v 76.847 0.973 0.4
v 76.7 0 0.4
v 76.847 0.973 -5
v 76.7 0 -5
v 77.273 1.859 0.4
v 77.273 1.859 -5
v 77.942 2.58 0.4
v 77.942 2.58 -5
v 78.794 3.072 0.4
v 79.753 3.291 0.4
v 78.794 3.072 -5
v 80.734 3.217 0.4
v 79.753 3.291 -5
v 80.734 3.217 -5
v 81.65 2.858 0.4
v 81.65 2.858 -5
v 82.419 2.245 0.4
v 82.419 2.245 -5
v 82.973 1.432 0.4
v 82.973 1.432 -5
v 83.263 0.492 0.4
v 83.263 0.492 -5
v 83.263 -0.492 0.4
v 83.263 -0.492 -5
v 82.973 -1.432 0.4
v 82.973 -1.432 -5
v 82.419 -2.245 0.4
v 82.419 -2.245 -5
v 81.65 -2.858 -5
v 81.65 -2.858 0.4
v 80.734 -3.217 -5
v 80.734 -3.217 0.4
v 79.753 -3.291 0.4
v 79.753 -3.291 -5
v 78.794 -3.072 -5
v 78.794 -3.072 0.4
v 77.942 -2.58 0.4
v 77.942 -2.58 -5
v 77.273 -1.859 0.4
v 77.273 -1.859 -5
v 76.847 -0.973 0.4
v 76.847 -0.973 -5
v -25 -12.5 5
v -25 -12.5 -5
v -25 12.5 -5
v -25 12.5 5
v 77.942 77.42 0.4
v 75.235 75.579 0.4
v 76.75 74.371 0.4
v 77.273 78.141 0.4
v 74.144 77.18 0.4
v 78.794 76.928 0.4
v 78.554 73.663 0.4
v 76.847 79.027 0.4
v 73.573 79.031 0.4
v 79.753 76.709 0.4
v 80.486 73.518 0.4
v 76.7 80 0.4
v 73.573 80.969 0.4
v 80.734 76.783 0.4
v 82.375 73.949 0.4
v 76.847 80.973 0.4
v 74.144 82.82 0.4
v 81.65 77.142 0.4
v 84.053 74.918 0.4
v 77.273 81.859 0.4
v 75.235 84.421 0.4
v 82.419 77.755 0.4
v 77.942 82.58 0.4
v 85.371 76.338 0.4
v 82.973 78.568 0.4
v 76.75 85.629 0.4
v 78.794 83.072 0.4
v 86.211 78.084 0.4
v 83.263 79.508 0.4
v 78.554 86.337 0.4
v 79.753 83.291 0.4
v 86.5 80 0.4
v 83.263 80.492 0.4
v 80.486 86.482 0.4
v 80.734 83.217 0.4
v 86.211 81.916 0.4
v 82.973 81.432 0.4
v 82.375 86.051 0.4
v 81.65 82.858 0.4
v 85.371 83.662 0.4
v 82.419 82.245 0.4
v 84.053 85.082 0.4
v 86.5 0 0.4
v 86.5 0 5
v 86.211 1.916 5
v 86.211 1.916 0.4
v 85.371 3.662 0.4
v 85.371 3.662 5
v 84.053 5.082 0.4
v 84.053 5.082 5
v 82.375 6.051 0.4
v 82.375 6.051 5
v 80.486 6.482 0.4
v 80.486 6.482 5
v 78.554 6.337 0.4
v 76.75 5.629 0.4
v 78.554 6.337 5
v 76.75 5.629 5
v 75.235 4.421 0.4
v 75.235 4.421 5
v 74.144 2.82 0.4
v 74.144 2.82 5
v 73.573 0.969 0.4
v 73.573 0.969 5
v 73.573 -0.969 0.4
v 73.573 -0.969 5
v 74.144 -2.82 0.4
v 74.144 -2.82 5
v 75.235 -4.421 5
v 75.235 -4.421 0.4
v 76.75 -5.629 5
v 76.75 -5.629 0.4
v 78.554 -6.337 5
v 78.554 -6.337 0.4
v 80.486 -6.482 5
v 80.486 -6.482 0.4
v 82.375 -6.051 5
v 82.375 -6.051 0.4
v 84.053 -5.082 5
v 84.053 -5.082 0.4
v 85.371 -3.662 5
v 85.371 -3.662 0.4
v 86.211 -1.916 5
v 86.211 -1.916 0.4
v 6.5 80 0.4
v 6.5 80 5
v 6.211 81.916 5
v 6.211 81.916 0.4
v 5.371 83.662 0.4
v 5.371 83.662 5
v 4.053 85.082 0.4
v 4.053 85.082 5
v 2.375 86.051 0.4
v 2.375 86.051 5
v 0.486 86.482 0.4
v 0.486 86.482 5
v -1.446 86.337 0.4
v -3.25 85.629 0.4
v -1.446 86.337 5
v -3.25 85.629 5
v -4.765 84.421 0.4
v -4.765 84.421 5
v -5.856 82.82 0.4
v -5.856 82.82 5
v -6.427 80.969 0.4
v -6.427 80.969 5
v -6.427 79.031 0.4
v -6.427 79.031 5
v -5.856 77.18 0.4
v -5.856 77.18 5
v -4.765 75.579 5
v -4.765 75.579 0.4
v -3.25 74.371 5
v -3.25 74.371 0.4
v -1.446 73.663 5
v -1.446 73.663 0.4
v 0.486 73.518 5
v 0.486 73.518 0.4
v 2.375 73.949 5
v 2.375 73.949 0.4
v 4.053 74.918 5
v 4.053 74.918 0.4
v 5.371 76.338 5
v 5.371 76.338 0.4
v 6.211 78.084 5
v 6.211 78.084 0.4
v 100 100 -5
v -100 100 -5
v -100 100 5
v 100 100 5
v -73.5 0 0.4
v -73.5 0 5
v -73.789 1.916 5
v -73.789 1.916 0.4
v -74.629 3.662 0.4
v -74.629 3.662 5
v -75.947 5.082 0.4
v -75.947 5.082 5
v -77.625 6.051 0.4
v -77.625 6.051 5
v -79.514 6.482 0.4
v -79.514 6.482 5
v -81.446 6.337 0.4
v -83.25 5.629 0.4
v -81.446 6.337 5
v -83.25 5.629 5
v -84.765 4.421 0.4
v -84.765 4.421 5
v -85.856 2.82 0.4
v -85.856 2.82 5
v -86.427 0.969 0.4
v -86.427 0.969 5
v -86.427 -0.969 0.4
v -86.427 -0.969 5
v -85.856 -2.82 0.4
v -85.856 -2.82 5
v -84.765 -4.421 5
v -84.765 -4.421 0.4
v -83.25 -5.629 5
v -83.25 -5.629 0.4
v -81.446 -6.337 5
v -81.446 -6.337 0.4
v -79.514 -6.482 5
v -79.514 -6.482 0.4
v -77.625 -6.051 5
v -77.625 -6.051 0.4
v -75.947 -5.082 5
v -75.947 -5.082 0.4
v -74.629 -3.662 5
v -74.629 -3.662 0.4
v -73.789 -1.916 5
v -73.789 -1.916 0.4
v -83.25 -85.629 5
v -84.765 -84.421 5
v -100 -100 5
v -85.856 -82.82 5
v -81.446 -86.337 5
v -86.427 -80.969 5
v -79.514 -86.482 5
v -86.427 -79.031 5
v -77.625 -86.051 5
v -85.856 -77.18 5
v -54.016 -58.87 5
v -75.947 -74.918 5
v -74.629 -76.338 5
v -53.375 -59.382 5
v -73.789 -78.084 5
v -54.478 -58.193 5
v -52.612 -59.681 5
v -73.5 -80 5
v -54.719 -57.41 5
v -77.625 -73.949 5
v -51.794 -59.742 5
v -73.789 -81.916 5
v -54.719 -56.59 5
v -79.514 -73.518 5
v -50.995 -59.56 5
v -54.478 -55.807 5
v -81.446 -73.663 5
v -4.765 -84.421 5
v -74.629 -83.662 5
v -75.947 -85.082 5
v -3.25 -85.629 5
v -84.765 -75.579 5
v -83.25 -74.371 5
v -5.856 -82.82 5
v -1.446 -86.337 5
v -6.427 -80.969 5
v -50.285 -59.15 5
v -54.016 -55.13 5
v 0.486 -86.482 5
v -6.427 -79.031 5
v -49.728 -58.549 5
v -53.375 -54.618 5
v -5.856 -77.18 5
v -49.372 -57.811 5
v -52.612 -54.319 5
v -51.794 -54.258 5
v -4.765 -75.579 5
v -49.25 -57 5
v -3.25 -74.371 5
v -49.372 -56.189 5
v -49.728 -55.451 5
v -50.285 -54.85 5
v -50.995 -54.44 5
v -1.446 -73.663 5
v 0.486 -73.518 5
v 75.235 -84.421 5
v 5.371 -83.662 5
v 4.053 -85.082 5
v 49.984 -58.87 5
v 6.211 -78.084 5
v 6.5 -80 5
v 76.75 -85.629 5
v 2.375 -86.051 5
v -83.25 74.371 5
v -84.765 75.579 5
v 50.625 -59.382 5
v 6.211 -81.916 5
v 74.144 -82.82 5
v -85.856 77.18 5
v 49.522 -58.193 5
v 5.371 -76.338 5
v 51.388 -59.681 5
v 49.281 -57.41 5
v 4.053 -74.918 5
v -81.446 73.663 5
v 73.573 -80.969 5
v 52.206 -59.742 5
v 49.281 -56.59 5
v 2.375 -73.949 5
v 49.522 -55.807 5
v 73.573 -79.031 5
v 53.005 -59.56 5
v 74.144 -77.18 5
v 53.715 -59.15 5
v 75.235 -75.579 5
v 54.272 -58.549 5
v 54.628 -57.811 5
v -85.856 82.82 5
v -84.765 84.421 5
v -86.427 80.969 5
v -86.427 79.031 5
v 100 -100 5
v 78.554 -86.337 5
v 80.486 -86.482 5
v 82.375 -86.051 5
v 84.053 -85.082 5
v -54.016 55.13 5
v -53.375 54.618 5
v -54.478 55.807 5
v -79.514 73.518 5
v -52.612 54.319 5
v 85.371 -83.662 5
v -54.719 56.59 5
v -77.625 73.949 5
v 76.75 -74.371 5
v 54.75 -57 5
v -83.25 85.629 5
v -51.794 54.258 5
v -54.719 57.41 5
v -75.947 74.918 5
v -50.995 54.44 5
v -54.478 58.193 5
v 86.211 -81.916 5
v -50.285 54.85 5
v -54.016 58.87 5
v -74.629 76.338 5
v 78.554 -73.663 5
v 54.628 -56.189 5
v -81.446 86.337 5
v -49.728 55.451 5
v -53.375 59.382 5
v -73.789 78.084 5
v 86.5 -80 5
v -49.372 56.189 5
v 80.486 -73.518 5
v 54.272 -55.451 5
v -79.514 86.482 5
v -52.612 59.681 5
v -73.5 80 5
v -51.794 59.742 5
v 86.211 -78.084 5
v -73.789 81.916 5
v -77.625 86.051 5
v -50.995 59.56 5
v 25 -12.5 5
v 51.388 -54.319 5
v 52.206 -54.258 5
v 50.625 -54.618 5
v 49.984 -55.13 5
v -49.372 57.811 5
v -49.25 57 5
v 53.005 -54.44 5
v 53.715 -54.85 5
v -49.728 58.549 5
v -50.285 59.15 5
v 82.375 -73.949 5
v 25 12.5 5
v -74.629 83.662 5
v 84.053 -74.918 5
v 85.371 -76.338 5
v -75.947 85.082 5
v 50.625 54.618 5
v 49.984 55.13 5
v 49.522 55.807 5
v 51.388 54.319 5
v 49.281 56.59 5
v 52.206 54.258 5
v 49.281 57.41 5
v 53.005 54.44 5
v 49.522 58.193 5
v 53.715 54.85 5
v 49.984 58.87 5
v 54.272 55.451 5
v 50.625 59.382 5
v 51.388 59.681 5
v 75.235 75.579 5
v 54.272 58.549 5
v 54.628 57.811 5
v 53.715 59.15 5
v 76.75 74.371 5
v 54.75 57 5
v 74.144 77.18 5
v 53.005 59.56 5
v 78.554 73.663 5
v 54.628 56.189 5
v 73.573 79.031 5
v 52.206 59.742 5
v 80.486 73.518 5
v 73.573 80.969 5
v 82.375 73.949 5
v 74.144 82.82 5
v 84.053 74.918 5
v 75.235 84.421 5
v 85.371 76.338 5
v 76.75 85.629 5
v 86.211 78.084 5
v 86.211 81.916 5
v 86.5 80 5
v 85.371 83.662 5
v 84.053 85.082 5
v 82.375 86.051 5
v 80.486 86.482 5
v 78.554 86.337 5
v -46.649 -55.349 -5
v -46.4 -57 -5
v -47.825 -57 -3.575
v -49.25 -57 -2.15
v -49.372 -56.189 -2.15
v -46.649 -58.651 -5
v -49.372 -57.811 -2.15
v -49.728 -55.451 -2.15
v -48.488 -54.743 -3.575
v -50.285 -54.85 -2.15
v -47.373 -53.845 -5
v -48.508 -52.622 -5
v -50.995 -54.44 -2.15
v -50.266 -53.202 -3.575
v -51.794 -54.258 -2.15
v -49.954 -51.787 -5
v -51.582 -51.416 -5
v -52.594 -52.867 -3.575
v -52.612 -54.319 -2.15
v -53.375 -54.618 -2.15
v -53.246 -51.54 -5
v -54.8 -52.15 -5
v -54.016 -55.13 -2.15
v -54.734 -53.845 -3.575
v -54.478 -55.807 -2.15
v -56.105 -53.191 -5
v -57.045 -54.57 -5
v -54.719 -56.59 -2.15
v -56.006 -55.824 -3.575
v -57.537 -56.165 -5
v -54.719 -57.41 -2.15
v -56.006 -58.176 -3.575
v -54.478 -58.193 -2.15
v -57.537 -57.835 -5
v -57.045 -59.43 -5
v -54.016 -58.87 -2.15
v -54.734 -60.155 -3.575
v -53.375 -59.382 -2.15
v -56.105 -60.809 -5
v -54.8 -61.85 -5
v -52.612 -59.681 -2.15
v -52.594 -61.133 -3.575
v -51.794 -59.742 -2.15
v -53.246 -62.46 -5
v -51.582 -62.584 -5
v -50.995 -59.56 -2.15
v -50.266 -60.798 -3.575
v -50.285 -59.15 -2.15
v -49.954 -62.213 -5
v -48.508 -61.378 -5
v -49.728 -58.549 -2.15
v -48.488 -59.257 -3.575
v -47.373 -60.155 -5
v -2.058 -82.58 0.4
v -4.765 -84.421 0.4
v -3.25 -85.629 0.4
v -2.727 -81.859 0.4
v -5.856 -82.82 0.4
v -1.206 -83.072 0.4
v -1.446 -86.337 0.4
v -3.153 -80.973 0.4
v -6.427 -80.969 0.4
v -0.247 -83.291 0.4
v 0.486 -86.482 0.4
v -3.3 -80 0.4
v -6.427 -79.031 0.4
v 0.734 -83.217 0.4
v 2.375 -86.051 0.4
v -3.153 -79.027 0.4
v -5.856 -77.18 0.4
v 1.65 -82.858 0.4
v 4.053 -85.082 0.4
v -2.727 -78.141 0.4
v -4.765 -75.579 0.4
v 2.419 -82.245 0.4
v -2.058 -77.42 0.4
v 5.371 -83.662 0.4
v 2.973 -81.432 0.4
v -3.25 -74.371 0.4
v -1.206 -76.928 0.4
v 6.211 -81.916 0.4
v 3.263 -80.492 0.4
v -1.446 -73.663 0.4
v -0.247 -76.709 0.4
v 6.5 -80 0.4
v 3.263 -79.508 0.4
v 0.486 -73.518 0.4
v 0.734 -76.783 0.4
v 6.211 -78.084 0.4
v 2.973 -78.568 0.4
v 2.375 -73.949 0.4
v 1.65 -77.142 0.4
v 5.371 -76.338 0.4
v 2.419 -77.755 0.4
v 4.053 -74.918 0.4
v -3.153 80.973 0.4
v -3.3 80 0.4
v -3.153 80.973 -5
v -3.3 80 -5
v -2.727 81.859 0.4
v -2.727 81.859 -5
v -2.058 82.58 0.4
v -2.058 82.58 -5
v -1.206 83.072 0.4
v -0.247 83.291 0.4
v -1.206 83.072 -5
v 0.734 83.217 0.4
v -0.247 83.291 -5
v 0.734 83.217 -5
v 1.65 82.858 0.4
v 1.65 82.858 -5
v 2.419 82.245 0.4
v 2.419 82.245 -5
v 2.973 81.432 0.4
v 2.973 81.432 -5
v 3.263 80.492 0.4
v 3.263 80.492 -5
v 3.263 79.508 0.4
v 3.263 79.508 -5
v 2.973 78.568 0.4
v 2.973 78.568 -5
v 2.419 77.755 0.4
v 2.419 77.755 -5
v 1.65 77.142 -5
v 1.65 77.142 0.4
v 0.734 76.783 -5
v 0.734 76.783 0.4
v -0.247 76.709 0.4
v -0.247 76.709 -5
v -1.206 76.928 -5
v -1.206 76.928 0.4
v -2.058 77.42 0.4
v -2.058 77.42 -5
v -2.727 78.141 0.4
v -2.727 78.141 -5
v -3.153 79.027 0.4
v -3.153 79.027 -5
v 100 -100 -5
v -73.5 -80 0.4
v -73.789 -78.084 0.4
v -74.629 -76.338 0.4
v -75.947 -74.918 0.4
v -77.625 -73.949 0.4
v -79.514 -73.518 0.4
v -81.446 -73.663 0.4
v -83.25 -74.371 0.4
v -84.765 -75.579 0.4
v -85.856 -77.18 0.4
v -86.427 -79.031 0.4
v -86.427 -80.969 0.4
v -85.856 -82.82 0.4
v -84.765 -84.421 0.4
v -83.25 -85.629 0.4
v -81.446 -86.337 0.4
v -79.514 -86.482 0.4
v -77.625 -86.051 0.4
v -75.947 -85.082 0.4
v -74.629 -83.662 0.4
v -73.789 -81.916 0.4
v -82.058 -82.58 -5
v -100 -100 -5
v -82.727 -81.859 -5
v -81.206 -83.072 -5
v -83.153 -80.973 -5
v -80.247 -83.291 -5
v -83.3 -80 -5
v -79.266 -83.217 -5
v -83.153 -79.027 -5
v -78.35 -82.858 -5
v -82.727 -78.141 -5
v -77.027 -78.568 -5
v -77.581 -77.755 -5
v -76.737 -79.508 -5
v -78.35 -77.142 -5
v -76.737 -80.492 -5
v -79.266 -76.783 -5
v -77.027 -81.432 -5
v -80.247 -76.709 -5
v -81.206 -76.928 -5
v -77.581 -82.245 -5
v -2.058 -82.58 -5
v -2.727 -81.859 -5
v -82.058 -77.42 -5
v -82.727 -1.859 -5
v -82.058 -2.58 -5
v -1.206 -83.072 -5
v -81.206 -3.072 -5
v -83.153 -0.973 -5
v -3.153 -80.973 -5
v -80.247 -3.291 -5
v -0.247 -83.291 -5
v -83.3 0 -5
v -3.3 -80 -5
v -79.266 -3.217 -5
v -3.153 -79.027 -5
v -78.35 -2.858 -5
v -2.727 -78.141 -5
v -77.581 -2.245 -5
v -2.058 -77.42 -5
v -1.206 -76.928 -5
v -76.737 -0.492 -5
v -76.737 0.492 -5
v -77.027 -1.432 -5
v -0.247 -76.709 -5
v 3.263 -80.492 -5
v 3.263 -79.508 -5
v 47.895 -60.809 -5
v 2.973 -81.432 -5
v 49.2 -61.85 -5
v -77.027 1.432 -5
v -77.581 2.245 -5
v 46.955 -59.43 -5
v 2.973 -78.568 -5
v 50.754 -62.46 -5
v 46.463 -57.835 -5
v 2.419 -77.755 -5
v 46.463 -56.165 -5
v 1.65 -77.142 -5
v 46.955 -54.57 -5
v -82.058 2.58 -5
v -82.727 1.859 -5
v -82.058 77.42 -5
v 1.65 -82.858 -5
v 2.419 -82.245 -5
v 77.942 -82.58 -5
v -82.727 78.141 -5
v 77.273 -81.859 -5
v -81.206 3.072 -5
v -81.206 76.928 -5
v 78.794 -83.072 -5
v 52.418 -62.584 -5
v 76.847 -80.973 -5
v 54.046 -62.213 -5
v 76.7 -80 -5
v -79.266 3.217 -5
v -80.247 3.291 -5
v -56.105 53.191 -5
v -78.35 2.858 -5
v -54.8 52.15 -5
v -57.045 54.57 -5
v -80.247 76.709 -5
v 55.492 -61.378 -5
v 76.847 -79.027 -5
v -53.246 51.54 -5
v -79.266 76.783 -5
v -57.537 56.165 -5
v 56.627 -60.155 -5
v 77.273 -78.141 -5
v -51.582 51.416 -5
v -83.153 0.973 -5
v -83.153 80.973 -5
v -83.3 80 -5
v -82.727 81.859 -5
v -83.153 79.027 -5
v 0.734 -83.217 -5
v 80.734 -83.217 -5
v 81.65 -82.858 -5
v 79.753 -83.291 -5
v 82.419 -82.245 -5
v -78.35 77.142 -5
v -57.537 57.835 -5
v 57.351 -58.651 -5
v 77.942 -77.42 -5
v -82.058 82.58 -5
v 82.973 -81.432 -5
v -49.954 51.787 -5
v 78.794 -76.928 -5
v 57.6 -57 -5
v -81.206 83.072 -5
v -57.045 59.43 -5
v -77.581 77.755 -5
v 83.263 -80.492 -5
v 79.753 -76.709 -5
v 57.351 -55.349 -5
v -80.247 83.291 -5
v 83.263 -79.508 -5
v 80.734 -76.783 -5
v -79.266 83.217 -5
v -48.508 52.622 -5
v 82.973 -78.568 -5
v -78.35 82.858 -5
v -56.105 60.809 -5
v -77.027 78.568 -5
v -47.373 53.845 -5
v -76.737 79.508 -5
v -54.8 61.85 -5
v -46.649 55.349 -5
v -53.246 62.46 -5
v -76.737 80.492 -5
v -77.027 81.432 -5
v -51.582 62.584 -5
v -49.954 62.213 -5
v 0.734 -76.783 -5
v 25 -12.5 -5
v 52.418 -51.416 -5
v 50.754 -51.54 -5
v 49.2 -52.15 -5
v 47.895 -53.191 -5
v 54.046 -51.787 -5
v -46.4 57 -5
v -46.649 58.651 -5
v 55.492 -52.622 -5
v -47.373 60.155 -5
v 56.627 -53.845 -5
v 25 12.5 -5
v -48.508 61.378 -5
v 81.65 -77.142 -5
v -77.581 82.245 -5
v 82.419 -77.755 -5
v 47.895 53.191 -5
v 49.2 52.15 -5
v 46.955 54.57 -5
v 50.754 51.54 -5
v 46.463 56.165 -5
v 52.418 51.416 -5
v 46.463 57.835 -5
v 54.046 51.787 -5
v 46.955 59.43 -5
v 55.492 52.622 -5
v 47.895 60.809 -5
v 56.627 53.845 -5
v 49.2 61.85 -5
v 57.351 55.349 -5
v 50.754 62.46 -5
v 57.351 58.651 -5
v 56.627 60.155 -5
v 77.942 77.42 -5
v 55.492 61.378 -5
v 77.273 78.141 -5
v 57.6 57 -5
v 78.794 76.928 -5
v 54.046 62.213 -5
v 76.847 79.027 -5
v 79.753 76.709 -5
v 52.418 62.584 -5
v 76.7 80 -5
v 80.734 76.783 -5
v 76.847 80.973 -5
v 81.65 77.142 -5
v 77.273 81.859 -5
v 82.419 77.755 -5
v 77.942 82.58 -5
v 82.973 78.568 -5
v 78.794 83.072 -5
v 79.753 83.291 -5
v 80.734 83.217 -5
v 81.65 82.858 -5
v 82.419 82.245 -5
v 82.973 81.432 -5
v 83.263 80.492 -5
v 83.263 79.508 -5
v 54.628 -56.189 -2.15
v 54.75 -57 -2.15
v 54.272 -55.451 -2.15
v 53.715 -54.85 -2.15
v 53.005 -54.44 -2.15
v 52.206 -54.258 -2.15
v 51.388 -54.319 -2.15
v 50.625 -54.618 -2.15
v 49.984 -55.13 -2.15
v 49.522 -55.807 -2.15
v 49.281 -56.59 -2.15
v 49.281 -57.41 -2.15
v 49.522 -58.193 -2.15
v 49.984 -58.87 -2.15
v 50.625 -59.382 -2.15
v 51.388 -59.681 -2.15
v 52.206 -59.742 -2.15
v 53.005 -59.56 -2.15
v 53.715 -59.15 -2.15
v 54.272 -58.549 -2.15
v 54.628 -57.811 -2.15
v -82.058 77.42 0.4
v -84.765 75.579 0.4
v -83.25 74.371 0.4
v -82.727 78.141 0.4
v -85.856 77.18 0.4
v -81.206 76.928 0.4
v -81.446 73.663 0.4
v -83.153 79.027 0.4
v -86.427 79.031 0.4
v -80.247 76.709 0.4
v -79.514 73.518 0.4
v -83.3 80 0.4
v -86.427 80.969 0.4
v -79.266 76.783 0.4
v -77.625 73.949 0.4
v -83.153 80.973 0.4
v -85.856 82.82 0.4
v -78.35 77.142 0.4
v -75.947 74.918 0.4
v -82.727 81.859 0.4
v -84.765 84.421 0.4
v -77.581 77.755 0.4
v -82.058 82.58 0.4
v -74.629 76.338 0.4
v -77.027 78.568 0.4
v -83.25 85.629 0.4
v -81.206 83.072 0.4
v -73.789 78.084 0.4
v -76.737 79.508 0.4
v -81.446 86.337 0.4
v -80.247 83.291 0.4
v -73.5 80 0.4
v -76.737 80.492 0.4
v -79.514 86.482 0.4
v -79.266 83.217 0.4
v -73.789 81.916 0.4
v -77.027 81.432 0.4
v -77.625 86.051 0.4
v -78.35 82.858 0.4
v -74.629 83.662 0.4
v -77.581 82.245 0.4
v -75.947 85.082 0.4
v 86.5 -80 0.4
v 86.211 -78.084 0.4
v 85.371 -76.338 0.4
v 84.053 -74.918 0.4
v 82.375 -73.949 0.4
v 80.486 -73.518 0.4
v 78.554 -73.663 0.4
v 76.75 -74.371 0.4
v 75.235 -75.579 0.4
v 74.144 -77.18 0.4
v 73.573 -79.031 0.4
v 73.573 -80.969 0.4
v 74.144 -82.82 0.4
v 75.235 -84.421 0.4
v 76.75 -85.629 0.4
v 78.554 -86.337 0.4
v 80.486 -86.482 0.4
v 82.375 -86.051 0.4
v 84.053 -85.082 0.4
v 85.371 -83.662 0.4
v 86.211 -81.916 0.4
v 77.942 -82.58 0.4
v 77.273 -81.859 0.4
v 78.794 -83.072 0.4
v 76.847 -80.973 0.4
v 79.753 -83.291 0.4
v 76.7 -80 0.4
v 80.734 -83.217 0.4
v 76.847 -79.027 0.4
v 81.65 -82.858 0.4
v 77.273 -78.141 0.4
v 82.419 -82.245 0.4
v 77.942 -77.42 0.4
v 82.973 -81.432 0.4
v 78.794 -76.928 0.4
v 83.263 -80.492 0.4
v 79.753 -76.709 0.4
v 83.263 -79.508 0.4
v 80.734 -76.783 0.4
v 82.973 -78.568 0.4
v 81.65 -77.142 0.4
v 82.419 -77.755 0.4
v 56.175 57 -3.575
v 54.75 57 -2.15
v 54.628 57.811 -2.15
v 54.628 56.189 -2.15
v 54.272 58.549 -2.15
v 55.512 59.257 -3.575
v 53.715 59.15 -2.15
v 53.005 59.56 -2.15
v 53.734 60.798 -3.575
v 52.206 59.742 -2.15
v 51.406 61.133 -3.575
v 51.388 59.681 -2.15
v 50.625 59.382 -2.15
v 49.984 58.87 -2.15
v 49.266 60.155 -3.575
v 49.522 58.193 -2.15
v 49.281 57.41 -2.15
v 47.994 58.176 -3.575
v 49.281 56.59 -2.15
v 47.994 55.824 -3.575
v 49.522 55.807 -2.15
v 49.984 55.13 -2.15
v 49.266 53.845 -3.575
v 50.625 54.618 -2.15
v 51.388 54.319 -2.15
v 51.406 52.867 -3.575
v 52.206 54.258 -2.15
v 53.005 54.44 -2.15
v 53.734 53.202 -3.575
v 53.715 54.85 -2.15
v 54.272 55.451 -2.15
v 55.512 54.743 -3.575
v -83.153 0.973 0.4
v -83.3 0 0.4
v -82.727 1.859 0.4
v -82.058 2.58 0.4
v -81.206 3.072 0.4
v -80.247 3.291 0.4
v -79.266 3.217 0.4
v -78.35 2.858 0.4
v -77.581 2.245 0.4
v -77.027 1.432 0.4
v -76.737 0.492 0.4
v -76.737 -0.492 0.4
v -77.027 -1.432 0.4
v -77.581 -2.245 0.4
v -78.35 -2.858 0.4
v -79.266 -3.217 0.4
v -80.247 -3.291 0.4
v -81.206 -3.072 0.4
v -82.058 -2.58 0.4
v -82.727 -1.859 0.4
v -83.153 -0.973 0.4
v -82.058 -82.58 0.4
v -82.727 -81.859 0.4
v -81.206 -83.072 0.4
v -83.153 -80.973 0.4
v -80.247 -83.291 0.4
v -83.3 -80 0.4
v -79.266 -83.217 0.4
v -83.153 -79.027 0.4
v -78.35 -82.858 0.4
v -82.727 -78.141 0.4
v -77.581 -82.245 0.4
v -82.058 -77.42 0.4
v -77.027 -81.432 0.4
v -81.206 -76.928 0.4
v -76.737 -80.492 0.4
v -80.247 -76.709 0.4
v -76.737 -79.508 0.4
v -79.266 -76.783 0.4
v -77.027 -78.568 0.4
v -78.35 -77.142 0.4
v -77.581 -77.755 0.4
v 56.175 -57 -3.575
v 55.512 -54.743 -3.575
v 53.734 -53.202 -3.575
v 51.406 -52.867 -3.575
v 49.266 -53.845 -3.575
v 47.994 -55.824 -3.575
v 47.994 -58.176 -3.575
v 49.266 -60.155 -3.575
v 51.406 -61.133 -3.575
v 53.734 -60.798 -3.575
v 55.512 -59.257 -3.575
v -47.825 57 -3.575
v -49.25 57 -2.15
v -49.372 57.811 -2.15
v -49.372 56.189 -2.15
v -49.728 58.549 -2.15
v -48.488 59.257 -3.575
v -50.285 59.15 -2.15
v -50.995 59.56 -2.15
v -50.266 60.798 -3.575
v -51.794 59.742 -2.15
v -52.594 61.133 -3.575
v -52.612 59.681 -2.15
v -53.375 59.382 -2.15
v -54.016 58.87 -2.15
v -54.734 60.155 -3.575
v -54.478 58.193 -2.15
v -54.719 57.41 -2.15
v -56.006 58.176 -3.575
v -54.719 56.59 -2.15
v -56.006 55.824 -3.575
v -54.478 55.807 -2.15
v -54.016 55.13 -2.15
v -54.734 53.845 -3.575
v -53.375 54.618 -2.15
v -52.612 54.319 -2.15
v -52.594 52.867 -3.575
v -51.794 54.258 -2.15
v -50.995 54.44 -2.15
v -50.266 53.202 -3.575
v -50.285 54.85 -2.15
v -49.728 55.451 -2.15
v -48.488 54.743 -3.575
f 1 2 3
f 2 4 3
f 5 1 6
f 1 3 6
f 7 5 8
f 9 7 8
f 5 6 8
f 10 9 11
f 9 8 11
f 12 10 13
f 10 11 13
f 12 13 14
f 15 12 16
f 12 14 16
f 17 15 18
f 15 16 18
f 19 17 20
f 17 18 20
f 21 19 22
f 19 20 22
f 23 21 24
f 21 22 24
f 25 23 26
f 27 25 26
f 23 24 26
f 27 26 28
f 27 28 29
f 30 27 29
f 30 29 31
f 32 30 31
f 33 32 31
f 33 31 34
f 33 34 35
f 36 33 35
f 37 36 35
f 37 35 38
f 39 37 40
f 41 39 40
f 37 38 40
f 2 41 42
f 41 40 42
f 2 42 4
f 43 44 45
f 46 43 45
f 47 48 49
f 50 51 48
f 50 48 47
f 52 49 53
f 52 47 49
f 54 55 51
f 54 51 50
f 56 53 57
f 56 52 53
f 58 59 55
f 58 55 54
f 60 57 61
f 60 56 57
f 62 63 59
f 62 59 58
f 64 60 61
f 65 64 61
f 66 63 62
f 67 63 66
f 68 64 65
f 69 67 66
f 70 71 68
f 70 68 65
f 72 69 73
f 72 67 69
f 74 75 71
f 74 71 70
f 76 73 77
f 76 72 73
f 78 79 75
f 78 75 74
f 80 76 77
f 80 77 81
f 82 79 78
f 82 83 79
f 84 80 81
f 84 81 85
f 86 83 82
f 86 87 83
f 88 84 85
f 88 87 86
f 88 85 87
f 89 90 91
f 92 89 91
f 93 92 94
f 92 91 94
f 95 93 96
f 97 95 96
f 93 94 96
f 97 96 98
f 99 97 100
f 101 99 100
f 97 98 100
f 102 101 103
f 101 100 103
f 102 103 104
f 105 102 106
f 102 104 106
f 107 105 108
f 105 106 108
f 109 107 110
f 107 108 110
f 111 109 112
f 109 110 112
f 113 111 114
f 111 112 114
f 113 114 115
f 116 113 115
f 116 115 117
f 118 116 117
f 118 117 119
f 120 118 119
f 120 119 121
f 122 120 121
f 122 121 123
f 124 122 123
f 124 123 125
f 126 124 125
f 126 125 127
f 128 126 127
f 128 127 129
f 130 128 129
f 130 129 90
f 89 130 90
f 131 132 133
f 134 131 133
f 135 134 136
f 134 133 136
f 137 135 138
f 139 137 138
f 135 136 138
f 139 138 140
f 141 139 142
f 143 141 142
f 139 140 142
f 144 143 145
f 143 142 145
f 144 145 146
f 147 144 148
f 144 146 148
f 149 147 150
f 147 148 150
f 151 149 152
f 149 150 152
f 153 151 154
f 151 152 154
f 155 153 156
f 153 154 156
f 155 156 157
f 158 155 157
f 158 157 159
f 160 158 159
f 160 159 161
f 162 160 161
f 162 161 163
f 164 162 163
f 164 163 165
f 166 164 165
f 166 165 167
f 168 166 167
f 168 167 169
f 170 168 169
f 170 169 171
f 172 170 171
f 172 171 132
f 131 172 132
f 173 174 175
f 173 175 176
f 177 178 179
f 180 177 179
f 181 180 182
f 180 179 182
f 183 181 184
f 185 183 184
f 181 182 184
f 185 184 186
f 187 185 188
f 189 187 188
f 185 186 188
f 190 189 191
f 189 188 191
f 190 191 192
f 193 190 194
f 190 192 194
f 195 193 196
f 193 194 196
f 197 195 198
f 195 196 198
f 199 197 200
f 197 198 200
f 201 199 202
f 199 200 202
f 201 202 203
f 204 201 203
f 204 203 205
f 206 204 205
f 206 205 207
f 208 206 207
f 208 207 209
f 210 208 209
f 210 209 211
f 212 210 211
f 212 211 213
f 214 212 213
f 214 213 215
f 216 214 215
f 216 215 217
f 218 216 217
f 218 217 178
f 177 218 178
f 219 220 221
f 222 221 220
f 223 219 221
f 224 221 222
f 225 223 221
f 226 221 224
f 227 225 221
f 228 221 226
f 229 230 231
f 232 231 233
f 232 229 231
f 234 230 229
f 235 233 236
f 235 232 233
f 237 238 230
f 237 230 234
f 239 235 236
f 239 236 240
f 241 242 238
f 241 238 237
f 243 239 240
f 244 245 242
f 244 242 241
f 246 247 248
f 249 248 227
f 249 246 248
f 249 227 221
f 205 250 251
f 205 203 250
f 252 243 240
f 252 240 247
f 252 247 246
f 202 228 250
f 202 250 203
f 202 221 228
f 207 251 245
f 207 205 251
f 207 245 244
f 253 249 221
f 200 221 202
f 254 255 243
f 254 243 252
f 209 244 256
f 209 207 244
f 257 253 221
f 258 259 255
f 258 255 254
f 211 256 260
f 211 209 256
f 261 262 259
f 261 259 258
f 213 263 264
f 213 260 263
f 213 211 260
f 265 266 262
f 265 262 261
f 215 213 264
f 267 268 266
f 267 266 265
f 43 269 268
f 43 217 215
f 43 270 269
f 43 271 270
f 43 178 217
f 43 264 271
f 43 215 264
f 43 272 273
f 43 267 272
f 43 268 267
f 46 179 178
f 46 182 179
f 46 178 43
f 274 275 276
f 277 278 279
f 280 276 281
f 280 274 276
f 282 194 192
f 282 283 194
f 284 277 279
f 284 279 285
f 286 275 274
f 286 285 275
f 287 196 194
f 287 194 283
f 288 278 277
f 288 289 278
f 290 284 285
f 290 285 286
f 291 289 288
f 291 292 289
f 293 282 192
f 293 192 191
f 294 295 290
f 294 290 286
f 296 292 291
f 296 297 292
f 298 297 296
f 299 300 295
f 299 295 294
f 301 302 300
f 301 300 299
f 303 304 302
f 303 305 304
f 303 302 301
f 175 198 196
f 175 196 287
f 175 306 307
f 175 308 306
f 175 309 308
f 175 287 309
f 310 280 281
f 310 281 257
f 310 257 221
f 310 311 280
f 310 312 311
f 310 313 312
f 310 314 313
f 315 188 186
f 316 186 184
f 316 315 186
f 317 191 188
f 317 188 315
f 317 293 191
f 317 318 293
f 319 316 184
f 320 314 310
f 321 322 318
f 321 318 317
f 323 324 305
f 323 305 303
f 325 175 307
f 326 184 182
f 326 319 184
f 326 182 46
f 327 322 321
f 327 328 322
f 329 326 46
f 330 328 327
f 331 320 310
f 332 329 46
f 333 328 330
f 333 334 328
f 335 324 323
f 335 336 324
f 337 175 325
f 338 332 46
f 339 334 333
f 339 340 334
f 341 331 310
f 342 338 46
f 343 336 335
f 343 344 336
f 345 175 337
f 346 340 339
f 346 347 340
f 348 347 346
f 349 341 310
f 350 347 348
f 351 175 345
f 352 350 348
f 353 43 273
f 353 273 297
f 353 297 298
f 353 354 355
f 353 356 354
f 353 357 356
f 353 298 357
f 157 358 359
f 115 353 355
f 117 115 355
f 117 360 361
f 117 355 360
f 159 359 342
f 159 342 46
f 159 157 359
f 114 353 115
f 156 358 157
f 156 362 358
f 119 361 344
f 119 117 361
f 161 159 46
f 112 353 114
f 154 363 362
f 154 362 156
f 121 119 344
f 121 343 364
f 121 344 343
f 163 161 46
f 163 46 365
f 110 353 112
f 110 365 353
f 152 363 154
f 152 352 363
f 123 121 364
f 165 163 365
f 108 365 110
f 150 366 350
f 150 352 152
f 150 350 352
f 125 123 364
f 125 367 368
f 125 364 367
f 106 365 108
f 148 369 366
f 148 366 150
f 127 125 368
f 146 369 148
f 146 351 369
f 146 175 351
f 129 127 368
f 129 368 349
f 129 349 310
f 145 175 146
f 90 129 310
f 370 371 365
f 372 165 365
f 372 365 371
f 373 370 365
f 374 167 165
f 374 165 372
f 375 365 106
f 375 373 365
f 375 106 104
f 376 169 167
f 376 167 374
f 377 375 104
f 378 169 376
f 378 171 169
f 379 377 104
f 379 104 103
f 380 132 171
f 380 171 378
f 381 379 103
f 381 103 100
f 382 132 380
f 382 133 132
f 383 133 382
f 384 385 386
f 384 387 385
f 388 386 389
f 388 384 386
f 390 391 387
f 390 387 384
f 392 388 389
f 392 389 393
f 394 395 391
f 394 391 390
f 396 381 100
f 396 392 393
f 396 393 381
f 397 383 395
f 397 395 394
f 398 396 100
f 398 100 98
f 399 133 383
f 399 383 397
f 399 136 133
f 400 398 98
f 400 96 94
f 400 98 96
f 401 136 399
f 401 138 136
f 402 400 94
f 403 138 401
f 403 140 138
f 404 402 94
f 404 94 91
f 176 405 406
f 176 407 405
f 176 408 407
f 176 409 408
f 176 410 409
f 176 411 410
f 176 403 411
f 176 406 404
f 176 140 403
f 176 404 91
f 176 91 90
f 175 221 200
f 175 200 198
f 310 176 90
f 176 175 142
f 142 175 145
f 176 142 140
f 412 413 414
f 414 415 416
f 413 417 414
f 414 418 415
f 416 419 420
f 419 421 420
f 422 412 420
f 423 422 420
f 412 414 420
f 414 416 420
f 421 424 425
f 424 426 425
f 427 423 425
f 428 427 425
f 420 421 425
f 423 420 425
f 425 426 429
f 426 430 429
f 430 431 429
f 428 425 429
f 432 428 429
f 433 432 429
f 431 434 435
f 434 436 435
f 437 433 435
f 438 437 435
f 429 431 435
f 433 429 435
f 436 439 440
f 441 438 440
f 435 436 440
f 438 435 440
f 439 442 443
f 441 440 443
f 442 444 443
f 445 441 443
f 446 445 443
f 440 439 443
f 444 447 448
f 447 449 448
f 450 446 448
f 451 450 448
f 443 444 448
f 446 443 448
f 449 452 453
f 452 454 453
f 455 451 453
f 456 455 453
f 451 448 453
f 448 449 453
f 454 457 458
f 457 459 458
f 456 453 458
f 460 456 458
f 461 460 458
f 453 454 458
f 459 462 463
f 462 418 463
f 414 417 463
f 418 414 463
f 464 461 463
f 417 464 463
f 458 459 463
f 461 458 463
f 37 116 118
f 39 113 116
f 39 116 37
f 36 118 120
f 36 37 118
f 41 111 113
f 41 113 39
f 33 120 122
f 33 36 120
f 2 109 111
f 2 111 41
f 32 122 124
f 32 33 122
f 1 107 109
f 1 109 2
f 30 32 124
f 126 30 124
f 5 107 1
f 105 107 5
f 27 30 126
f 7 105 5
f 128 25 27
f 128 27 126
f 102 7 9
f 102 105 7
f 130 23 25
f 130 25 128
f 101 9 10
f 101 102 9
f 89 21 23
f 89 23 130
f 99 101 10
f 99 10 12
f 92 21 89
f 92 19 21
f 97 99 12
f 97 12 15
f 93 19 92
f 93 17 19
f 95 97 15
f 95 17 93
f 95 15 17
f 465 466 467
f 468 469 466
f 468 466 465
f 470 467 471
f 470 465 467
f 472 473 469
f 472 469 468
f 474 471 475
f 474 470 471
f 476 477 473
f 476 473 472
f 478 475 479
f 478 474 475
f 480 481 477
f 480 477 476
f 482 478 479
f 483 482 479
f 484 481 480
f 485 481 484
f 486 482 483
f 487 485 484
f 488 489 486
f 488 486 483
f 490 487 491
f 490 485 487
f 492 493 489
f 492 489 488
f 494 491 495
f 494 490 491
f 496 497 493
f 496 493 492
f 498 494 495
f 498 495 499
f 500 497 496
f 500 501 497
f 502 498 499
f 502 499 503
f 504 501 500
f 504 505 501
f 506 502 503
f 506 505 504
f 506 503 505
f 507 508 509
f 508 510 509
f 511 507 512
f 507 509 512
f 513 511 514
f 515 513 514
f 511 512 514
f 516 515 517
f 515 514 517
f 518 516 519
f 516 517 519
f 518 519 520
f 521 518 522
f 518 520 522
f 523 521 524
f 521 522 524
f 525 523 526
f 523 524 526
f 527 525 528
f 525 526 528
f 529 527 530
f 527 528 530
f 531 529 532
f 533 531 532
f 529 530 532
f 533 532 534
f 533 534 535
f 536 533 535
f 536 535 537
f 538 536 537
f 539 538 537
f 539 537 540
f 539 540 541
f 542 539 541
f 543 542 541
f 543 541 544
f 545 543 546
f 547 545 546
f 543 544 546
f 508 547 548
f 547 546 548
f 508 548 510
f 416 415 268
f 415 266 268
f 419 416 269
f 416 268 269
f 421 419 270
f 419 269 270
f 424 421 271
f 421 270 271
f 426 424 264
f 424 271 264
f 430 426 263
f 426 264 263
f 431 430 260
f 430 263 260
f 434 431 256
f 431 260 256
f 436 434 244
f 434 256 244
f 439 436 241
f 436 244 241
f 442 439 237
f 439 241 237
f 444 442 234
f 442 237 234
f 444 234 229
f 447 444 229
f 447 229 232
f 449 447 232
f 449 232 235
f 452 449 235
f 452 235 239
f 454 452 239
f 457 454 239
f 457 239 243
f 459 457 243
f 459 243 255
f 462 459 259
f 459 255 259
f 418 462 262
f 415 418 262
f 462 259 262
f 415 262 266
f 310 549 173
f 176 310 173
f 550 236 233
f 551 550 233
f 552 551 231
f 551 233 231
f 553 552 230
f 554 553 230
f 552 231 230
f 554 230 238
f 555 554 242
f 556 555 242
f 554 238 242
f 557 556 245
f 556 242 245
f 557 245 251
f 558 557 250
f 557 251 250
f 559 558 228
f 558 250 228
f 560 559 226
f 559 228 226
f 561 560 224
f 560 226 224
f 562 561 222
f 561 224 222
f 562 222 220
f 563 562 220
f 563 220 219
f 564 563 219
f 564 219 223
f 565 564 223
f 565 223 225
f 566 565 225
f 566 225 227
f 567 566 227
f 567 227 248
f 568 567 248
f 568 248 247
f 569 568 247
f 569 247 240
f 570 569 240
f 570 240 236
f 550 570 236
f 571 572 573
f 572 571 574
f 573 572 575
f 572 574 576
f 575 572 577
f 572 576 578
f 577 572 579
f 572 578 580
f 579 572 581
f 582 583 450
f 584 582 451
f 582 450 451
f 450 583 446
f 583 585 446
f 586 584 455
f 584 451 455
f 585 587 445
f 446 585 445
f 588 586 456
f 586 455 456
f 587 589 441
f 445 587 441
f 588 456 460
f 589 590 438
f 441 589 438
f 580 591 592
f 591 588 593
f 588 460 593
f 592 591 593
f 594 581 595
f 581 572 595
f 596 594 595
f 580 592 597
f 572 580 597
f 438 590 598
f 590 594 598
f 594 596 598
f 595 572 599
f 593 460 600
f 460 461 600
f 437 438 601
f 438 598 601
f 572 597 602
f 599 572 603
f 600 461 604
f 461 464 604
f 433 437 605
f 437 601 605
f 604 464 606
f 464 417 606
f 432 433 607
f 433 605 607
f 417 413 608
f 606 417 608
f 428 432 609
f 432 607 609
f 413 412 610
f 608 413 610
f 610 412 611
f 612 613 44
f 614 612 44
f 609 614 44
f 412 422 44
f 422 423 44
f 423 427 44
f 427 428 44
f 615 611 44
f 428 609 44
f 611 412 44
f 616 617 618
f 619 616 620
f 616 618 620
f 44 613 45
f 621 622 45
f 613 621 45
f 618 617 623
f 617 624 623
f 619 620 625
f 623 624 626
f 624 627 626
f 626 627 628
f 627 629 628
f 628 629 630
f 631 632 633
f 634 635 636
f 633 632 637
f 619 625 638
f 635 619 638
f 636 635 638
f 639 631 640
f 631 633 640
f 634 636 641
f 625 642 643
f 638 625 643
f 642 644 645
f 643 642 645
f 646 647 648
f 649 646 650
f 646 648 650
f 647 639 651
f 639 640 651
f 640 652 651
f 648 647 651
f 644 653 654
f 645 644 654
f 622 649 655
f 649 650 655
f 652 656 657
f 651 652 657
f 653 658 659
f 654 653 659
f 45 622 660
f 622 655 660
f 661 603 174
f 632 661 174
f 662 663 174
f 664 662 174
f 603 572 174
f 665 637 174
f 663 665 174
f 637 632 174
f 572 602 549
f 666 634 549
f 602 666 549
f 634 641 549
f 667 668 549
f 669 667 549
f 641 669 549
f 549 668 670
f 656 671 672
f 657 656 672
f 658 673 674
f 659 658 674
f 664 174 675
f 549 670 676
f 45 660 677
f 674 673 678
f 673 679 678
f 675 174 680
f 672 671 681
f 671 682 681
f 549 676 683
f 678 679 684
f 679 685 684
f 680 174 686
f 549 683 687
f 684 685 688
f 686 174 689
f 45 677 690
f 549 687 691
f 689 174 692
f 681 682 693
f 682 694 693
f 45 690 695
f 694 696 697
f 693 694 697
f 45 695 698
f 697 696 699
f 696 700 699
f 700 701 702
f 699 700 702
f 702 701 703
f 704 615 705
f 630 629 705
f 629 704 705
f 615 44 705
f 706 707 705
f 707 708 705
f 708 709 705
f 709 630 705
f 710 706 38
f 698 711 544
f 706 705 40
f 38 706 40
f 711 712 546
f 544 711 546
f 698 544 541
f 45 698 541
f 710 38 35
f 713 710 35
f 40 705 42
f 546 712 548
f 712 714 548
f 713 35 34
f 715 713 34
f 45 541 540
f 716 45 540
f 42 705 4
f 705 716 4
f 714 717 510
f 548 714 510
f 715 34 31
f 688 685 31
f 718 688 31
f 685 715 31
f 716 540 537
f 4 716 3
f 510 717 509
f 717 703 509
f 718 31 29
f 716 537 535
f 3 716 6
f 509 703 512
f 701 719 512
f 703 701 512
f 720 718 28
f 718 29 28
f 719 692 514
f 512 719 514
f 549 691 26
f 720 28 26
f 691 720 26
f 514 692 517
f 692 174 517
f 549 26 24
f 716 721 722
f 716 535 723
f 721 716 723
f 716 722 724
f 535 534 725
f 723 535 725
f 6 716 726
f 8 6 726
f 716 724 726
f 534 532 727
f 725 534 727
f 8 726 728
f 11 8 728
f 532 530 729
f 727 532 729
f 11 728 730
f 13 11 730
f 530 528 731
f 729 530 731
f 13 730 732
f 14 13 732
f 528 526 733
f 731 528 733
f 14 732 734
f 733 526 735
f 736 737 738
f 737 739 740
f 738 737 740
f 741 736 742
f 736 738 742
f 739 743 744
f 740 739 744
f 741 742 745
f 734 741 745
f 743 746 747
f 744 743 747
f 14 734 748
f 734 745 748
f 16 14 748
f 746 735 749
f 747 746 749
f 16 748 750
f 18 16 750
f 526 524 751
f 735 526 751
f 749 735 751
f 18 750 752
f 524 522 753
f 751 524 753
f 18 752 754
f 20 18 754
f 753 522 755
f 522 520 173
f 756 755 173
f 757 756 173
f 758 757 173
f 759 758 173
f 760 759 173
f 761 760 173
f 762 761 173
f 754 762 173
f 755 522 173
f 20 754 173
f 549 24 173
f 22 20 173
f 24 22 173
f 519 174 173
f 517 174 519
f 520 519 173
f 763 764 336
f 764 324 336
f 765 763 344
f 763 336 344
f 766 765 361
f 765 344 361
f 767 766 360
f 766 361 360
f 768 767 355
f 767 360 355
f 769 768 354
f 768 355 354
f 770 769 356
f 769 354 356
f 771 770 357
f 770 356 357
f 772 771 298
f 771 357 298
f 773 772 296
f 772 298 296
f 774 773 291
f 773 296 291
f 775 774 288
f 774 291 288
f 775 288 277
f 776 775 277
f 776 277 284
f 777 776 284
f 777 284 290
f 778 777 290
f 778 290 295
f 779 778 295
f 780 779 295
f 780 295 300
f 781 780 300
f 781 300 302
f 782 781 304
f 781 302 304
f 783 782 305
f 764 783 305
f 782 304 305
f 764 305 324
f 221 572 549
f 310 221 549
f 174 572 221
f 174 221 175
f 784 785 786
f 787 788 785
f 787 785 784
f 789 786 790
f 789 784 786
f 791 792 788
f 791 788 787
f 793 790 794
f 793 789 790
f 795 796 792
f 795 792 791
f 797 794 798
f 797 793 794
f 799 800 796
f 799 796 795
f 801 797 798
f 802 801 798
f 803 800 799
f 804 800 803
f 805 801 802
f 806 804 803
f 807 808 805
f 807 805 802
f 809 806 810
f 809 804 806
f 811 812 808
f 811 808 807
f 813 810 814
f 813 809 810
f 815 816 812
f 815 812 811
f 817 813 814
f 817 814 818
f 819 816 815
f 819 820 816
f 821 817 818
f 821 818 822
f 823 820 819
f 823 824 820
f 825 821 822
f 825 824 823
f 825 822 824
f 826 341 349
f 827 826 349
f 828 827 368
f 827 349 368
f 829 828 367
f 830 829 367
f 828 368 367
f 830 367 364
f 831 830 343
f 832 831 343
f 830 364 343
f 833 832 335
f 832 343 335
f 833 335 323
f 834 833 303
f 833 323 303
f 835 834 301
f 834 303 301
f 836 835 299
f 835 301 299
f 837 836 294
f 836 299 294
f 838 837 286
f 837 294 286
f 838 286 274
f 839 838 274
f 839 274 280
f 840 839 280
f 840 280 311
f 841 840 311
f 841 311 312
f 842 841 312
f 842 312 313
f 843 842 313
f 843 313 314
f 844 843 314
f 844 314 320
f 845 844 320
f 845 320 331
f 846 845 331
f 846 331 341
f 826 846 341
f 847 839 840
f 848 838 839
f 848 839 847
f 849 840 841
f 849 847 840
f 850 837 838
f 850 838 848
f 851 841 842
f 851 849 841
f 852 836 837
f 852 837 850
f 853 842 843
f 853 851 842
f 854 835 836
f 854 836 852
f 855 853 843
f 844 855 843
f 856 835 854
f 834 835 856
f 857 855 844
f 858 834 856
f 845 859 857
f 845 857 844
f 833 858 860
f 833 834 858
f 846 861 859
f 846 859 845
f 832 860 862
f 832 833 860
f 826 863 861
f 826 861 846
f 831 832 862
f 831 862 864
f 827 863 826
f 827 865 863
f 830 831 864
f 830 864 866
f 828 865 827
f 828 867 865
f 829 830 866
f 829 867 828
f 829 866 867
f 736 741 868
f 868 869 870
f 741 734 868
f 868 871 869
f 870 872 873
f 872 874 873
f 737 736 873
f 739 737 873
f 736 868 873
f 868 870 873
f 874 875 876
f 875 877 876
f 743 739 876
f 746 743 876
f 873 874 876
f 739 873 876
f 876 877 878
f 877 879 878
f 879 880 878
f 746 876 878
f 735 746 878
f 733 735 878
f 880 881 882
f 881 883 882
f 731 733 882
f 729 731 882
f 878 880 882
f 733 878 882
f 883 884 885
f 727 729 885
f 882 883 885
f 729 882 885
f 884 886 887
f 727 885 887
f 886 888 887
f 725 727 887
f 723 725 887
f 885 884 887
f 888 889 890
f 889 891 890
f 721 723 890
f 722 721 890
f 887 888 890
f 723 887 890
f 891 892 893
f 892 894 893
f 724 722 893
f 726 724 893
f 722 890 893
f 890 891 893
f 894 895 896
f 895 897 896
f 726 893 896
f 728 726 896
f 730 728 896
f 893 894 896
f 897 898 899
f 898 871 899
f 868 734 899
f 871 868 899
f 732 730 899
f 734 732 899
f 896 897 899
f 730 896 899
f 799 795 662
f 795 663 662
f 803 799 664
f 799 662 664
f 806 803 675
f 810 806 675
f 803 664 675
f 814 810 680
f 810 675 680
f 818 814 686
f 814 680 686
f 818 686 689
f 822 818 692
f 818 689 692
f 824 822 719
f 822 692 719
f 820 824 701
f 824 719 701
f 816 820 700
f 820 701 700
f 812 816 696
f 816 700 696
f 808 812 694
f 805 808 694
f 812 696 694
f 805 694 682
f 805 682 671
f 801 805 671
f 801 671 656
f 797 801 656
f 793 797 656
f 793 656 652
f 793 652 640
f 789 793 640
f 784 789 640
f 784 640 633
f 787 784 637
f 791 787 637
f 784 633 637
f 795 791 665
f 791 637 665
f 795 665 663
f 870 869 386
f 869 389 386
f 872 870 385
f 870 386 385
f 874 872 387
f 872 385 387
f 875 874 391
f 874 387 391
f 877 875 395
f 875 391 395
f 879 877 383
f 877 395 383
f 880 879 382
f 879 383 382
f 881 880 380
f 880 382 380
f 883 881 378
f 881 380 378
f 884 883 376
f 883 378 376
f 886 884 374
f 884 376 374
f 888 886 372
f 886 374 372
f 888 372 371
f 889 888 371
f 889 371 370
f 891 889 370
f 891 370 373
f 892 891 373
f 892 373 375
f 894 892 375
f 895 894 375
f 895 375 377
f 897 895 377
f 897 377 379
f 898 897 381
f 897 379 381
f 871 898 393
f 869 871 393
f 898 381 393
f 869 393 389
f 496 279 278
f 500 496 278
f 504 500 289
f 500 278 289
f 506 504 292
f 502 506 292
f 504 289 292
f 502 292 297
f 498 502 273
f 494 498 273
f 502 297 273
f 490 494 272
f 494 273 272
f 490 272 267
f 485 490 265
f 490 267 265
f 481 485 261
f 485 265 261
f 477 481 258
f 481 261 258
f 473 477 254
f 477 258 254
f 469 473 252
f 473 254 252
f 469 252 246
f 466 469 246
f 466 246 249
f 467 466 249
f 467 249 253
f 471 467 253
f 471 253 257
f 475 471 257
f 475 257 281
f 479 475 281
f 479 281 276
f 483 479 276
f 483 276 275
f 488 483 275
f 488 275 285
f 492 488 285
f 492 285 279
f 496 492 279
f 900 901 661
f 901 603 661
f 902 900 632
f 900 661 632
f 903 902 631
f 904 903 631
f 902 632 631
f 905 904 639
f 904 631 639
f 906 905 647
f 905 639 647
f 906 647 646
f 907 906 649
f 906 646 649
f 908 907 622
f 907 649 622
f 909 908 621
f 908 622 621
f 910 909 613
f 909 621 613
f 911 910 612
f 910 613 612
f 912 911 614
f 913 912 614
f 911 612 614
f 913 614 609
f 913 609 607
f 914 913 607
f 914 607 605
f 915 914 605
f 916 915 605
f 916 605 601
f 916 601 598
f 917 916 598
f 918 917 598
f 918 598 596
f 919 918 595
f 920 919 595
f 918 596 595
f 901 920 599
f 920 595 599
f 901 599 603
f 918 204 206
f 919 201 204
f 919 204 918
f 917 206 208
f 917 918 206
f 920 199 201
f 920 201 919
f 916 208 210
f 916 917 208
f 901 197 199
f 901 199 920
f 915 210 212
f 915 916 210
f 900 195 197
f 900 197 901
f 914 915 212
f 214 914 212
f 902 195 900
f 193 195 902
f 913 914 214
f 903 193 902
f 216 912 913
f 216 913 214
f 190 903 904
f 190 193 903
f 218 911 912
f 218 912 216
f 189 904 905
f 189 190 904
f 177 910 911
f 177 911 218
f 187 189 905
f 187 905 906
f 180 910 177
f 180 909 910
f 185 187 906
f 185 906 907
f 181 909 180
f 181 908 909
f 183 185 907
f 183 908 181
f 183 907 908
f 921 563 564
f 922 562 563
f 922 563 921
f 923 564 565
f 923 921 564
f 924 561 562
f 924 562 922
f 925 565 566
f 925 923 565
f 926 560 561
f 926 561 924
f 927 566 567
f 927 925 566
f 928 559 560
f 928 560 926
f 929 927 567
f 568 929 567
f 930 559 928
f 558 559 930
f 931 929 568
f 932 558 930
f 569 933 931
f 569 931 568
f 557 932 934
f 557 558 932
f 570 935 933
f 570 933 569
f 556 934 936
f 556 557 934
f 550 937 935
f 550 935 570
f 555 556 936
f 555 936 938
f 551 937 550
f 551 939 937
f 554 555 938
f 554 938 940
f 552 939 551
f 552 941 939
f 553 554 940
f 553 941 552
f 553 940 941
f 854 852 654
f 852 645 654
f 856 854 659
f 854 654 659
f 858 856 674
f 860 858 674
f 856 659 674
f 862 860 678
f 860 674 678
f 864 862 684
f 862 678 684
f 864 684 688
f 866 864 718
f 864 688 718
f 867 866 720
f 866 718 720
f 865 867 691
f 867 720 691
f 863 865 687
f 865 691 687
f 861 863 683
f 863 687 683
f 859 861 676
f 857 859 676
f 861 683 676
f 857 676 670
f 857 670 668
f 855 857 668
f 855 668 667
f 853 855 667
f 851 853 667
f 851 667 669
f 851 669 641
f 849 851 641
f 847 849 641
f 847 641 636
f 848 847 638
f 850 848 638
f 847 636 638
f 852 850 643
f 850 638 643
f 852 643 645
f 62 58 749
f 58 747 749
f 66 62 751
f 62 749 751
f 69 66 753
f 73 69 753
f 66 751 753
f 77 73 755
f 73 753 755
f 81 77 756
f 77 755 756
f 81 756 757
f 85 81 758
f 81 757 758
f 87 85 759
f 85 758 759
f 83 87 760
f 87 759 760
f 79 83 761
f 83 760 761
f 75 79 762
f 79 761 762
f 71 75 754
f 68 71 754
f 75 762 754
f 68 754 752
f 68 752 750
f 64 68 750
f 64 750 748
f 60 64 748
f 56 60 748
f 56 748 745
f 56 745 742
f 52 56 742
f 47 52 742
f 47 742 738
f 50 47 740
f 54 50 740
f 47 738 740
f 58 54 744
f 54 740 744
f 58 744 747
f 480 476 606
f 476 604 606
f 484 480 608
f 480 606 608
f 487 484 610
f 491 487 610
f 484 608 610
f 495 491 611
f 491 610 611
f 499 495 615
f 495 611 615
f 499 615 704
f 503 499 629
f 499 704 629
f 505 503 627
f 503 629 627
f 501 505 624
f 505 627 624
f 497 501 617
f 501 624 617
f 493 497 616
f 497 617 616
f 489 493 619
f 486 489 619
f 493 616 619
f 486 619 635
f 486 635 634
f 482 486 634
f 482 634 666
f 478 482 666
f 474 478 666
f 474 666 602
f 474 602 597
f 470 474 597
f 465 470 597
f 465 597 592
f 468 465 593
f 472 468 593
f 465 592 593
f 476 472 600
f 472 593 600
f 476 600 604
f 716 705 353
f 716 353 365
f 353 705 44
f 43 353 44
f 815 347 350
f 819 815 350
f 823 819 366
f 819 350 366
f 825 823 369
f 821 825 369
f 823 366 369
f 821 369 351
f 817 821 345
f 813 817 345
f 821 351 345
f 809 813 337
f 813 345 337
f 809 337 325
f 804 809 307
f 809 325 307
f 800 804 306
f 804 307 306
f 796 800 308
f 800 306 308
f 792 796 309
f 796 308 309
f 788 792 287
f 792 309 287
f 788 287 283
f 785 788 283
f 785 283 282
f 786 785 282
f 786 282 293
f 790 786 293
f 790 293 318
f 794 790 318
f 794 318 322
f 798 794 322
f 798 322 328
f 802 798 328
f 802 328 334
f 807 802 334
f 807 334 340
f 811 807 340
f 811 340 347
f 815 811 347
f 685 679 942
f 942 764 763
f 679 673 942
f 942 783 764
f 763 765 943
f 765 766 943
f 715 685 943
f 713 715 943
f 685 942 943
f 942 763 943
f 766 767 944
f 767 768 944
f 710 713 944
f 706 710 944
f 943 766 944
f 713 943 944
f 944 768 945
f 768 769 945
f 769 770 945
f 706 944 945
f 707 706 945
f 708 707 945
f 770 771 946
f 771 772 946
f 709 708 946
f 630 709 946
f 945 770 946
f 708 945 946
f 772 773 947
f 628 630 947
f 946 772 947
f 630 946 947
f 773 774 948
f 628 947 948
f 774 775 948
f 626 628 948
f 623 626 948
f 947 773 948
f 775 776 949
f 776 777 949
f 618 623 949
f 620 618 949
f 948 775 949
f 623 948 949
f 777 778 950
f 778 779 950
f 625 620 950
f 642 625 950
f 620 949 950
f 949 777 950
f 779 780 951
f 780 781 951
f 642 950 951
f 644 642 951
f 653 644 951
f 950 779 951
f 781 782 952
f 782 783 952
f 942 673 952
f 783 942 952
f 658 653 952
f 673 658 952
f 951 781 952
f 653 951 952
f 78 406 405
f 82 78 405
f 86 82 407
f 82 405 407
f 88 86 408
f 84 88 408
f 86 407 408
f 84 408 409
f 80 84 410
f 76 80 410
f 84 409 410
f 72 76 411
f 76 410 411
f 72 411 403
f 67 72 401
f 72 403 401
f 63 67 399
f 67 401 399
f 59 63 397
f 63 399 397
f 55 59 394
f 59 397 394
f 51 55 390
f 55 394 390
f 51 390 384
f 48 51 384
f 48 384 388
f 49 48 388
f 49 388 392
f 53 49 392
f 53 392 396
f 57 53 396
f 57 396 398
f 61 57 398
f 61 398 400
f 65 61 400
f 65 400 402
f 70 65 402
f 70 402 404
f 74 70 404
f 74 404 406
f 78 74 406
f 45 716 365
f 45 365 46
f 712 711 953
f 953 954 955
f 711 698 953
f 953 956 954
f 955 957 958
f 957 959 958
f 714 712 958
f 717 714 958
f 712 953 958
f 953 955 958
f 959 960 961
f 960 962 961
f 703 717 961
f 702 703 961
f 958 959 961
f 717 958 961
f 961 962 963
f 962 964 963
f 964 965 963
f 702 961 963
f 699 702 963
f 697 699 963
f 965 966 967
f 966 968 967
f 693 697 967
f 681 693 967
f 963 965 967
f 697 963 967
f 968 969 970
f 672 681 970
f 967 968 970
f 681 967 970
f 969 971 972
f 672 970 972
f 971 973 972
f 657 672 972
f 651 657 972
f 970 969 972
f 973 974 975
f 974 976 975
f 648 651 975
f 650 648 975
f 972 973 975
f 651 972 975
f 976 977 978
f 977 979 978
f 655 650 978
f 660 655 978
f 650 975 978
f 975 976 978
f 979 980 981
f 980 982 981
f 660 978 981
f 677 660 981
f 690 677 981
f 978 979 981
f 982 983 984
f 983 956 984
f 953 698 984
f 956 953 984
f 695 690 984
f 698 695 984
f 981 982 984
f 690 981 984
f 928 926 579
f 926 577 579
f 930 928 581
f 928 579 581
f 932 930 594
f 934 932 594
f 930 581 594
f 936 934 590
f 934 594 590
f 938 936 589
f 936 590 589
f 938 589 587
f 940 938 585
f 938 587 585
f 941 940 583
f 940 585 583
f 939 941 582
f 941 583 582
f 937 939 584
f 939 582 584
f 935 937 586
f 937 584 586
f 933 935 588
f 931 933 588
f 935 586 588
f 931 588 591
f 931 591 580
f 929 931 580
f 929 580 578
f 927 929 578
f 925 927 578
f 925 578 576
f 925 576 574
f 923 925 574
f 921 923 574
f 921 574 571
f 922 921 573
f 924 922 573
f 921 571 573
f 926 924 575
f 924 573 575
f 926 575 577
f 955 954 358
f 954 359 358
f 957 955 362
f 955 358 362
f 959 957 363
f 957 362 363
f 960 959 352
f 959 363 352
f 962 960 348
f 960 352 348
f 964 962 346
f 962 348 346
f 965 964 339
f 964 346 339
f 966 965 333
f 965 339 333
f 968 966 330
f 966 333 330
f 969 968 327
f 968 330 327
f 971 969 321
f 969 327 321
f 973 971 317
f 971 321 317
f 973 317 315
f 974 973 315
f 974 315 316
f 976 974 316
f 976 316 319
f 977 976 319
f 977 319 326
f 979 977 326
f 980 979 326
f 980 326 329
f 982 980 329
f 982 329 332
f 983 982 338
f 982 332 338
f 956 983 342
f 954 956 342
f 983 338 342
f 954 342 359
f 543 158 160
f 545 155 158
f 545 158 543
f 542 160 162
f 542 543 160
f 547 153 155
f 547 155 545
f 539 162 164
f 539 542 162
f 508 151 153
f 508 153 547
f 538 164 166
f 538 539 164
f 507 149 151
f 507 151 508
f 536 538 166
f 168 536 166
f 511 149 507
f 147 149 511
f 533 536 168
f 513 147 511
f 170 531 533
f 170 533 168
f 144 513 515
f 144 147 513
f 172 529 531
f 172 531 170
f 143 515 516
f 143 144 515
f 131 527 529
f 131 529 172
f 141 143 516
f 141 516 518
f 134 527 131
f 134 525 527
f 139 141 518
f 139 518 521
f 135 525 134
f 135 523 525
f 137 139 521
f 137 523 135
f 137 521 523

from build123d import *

# Parameters (mm, degrees)
BOSS_EXTRUDE1_DEPTH                                  = 5
BOSS_EXTRUDE1_DEPTH_BACK                             = 5
SKETCH1_W                                            = 200
SKETCH1_H                                            = 200
TAP_DRILL_FOR_M5X0_8_TAP1_D                          = 5
SKETCH5_W                                            = 50
SKETCH5_H                                            = 25
CUT_EXTRUDE2_DEPTH                                   = 20
CBORE_FOR_M6_PAN_HEAD_SCREW1_D                       = 6.6
CBORE_FOR_M6_PAN_HEAD_SCREW1_CBORE_D                 = 13
CBORE_FOR_M6_PAN_HEAD_SCREW1_CBORE_DEPTH             = 4.6
CSK_FOR_M5_HEX_SOCKET_COUNTERSUNK_CAP_SC_D           = 5.5
CSK_FOR_M5_HEX_SOCKET_COUNTERSUNK_CAP_SC_CSINK_D     = 11.2
CSK_FOR_M5_HEX_SOCKET_COUNTERSUNK_CAP_SC_CSINK_ANGLE = 90


with BuildPart() as part:
    # Sketch1 → Boss-Extrude1 (new, two sides: drawn at the far end of the back side and taken through both)
    with BuildSketch(Plane.XY.offset(-BOSS_EXTRUDE1_DEPTH_BACK)):
        Rectangle(SKETCH1_W, SKETCH1_H)
    extrude(amount=BOSS_EXTRUDE1_DEPTH + BOSS_EXTRUDE1_DEPTH_BACK)

    # Tap Drill for M5x0.8 Tap1 (through all)
    with Locations(Plane(origin=(0, 0, -5), x_dir=(-1, 0, 0), z_dir=(0, 0, -1))):
        with Locations((-52, 57), (52, 57), (52, -57), (-52, -57)):
            Hole(TAP_DRILL_FOR_M5X0_8_TAP1_D / 2)

    # Sketch5 → Cut-Extrude2 (cut)
    with BuildSketch(Plane(origin=(0, 0, -5), x_dir=(-1, 0, 0), z_dir=(0, 0, -1))):
        Rectangle(SKETCH5_W, SKETCH5_H)
    extrude(amount=-CUT_EXTRUDE2_DEPTH, mode=Mode.SUBTRACT)

    # CBORE for M6 Pan Head Screw1 (through all)
    with Locations(Plane.XY.offset(5)):
        with Locations((-80, 80), (-80, 0), (-80, -80), (80, 80), (80, 0), (80, -80), (0, 80), (0, -80)):
            CounterBoreHole(CBORE_FOR_M6_PAN_HEAD_SCREW1_D / 2, CBORE_FOR_M6_PAN_HEAD_SCREW1_CBORE_D / 2, CBORE_FOR_M6_PAN_HEAD_SCREW1_CBORE_DEPTH)

    # CSK for M5 Hex Socket Countersunk Cap Screw1 (through all)
    with Locations(Plane(origin=(0, 0, -5), x_dir=(-1, 0, 0), z_dir=(0, 0, -1))):
        with Locations((-52, 57), (52, 57), (52, -57), (-52, -57)):
            CounterSinkHole(CSK_FOR_M5_HEX_SOCKET_COUNTERSUNK_CAP_SC_D / 2, CSK_FOR_M5_HEX_SOCKET_COUNTERSUNK_CAP_SC_CSINK_D / 2, counter_sink_angle=CSK_FOR_M5_HEX_SOCKET_COUNTERSUNK_CAP_SC_CSINK_ANGLE)


solid = part.part
